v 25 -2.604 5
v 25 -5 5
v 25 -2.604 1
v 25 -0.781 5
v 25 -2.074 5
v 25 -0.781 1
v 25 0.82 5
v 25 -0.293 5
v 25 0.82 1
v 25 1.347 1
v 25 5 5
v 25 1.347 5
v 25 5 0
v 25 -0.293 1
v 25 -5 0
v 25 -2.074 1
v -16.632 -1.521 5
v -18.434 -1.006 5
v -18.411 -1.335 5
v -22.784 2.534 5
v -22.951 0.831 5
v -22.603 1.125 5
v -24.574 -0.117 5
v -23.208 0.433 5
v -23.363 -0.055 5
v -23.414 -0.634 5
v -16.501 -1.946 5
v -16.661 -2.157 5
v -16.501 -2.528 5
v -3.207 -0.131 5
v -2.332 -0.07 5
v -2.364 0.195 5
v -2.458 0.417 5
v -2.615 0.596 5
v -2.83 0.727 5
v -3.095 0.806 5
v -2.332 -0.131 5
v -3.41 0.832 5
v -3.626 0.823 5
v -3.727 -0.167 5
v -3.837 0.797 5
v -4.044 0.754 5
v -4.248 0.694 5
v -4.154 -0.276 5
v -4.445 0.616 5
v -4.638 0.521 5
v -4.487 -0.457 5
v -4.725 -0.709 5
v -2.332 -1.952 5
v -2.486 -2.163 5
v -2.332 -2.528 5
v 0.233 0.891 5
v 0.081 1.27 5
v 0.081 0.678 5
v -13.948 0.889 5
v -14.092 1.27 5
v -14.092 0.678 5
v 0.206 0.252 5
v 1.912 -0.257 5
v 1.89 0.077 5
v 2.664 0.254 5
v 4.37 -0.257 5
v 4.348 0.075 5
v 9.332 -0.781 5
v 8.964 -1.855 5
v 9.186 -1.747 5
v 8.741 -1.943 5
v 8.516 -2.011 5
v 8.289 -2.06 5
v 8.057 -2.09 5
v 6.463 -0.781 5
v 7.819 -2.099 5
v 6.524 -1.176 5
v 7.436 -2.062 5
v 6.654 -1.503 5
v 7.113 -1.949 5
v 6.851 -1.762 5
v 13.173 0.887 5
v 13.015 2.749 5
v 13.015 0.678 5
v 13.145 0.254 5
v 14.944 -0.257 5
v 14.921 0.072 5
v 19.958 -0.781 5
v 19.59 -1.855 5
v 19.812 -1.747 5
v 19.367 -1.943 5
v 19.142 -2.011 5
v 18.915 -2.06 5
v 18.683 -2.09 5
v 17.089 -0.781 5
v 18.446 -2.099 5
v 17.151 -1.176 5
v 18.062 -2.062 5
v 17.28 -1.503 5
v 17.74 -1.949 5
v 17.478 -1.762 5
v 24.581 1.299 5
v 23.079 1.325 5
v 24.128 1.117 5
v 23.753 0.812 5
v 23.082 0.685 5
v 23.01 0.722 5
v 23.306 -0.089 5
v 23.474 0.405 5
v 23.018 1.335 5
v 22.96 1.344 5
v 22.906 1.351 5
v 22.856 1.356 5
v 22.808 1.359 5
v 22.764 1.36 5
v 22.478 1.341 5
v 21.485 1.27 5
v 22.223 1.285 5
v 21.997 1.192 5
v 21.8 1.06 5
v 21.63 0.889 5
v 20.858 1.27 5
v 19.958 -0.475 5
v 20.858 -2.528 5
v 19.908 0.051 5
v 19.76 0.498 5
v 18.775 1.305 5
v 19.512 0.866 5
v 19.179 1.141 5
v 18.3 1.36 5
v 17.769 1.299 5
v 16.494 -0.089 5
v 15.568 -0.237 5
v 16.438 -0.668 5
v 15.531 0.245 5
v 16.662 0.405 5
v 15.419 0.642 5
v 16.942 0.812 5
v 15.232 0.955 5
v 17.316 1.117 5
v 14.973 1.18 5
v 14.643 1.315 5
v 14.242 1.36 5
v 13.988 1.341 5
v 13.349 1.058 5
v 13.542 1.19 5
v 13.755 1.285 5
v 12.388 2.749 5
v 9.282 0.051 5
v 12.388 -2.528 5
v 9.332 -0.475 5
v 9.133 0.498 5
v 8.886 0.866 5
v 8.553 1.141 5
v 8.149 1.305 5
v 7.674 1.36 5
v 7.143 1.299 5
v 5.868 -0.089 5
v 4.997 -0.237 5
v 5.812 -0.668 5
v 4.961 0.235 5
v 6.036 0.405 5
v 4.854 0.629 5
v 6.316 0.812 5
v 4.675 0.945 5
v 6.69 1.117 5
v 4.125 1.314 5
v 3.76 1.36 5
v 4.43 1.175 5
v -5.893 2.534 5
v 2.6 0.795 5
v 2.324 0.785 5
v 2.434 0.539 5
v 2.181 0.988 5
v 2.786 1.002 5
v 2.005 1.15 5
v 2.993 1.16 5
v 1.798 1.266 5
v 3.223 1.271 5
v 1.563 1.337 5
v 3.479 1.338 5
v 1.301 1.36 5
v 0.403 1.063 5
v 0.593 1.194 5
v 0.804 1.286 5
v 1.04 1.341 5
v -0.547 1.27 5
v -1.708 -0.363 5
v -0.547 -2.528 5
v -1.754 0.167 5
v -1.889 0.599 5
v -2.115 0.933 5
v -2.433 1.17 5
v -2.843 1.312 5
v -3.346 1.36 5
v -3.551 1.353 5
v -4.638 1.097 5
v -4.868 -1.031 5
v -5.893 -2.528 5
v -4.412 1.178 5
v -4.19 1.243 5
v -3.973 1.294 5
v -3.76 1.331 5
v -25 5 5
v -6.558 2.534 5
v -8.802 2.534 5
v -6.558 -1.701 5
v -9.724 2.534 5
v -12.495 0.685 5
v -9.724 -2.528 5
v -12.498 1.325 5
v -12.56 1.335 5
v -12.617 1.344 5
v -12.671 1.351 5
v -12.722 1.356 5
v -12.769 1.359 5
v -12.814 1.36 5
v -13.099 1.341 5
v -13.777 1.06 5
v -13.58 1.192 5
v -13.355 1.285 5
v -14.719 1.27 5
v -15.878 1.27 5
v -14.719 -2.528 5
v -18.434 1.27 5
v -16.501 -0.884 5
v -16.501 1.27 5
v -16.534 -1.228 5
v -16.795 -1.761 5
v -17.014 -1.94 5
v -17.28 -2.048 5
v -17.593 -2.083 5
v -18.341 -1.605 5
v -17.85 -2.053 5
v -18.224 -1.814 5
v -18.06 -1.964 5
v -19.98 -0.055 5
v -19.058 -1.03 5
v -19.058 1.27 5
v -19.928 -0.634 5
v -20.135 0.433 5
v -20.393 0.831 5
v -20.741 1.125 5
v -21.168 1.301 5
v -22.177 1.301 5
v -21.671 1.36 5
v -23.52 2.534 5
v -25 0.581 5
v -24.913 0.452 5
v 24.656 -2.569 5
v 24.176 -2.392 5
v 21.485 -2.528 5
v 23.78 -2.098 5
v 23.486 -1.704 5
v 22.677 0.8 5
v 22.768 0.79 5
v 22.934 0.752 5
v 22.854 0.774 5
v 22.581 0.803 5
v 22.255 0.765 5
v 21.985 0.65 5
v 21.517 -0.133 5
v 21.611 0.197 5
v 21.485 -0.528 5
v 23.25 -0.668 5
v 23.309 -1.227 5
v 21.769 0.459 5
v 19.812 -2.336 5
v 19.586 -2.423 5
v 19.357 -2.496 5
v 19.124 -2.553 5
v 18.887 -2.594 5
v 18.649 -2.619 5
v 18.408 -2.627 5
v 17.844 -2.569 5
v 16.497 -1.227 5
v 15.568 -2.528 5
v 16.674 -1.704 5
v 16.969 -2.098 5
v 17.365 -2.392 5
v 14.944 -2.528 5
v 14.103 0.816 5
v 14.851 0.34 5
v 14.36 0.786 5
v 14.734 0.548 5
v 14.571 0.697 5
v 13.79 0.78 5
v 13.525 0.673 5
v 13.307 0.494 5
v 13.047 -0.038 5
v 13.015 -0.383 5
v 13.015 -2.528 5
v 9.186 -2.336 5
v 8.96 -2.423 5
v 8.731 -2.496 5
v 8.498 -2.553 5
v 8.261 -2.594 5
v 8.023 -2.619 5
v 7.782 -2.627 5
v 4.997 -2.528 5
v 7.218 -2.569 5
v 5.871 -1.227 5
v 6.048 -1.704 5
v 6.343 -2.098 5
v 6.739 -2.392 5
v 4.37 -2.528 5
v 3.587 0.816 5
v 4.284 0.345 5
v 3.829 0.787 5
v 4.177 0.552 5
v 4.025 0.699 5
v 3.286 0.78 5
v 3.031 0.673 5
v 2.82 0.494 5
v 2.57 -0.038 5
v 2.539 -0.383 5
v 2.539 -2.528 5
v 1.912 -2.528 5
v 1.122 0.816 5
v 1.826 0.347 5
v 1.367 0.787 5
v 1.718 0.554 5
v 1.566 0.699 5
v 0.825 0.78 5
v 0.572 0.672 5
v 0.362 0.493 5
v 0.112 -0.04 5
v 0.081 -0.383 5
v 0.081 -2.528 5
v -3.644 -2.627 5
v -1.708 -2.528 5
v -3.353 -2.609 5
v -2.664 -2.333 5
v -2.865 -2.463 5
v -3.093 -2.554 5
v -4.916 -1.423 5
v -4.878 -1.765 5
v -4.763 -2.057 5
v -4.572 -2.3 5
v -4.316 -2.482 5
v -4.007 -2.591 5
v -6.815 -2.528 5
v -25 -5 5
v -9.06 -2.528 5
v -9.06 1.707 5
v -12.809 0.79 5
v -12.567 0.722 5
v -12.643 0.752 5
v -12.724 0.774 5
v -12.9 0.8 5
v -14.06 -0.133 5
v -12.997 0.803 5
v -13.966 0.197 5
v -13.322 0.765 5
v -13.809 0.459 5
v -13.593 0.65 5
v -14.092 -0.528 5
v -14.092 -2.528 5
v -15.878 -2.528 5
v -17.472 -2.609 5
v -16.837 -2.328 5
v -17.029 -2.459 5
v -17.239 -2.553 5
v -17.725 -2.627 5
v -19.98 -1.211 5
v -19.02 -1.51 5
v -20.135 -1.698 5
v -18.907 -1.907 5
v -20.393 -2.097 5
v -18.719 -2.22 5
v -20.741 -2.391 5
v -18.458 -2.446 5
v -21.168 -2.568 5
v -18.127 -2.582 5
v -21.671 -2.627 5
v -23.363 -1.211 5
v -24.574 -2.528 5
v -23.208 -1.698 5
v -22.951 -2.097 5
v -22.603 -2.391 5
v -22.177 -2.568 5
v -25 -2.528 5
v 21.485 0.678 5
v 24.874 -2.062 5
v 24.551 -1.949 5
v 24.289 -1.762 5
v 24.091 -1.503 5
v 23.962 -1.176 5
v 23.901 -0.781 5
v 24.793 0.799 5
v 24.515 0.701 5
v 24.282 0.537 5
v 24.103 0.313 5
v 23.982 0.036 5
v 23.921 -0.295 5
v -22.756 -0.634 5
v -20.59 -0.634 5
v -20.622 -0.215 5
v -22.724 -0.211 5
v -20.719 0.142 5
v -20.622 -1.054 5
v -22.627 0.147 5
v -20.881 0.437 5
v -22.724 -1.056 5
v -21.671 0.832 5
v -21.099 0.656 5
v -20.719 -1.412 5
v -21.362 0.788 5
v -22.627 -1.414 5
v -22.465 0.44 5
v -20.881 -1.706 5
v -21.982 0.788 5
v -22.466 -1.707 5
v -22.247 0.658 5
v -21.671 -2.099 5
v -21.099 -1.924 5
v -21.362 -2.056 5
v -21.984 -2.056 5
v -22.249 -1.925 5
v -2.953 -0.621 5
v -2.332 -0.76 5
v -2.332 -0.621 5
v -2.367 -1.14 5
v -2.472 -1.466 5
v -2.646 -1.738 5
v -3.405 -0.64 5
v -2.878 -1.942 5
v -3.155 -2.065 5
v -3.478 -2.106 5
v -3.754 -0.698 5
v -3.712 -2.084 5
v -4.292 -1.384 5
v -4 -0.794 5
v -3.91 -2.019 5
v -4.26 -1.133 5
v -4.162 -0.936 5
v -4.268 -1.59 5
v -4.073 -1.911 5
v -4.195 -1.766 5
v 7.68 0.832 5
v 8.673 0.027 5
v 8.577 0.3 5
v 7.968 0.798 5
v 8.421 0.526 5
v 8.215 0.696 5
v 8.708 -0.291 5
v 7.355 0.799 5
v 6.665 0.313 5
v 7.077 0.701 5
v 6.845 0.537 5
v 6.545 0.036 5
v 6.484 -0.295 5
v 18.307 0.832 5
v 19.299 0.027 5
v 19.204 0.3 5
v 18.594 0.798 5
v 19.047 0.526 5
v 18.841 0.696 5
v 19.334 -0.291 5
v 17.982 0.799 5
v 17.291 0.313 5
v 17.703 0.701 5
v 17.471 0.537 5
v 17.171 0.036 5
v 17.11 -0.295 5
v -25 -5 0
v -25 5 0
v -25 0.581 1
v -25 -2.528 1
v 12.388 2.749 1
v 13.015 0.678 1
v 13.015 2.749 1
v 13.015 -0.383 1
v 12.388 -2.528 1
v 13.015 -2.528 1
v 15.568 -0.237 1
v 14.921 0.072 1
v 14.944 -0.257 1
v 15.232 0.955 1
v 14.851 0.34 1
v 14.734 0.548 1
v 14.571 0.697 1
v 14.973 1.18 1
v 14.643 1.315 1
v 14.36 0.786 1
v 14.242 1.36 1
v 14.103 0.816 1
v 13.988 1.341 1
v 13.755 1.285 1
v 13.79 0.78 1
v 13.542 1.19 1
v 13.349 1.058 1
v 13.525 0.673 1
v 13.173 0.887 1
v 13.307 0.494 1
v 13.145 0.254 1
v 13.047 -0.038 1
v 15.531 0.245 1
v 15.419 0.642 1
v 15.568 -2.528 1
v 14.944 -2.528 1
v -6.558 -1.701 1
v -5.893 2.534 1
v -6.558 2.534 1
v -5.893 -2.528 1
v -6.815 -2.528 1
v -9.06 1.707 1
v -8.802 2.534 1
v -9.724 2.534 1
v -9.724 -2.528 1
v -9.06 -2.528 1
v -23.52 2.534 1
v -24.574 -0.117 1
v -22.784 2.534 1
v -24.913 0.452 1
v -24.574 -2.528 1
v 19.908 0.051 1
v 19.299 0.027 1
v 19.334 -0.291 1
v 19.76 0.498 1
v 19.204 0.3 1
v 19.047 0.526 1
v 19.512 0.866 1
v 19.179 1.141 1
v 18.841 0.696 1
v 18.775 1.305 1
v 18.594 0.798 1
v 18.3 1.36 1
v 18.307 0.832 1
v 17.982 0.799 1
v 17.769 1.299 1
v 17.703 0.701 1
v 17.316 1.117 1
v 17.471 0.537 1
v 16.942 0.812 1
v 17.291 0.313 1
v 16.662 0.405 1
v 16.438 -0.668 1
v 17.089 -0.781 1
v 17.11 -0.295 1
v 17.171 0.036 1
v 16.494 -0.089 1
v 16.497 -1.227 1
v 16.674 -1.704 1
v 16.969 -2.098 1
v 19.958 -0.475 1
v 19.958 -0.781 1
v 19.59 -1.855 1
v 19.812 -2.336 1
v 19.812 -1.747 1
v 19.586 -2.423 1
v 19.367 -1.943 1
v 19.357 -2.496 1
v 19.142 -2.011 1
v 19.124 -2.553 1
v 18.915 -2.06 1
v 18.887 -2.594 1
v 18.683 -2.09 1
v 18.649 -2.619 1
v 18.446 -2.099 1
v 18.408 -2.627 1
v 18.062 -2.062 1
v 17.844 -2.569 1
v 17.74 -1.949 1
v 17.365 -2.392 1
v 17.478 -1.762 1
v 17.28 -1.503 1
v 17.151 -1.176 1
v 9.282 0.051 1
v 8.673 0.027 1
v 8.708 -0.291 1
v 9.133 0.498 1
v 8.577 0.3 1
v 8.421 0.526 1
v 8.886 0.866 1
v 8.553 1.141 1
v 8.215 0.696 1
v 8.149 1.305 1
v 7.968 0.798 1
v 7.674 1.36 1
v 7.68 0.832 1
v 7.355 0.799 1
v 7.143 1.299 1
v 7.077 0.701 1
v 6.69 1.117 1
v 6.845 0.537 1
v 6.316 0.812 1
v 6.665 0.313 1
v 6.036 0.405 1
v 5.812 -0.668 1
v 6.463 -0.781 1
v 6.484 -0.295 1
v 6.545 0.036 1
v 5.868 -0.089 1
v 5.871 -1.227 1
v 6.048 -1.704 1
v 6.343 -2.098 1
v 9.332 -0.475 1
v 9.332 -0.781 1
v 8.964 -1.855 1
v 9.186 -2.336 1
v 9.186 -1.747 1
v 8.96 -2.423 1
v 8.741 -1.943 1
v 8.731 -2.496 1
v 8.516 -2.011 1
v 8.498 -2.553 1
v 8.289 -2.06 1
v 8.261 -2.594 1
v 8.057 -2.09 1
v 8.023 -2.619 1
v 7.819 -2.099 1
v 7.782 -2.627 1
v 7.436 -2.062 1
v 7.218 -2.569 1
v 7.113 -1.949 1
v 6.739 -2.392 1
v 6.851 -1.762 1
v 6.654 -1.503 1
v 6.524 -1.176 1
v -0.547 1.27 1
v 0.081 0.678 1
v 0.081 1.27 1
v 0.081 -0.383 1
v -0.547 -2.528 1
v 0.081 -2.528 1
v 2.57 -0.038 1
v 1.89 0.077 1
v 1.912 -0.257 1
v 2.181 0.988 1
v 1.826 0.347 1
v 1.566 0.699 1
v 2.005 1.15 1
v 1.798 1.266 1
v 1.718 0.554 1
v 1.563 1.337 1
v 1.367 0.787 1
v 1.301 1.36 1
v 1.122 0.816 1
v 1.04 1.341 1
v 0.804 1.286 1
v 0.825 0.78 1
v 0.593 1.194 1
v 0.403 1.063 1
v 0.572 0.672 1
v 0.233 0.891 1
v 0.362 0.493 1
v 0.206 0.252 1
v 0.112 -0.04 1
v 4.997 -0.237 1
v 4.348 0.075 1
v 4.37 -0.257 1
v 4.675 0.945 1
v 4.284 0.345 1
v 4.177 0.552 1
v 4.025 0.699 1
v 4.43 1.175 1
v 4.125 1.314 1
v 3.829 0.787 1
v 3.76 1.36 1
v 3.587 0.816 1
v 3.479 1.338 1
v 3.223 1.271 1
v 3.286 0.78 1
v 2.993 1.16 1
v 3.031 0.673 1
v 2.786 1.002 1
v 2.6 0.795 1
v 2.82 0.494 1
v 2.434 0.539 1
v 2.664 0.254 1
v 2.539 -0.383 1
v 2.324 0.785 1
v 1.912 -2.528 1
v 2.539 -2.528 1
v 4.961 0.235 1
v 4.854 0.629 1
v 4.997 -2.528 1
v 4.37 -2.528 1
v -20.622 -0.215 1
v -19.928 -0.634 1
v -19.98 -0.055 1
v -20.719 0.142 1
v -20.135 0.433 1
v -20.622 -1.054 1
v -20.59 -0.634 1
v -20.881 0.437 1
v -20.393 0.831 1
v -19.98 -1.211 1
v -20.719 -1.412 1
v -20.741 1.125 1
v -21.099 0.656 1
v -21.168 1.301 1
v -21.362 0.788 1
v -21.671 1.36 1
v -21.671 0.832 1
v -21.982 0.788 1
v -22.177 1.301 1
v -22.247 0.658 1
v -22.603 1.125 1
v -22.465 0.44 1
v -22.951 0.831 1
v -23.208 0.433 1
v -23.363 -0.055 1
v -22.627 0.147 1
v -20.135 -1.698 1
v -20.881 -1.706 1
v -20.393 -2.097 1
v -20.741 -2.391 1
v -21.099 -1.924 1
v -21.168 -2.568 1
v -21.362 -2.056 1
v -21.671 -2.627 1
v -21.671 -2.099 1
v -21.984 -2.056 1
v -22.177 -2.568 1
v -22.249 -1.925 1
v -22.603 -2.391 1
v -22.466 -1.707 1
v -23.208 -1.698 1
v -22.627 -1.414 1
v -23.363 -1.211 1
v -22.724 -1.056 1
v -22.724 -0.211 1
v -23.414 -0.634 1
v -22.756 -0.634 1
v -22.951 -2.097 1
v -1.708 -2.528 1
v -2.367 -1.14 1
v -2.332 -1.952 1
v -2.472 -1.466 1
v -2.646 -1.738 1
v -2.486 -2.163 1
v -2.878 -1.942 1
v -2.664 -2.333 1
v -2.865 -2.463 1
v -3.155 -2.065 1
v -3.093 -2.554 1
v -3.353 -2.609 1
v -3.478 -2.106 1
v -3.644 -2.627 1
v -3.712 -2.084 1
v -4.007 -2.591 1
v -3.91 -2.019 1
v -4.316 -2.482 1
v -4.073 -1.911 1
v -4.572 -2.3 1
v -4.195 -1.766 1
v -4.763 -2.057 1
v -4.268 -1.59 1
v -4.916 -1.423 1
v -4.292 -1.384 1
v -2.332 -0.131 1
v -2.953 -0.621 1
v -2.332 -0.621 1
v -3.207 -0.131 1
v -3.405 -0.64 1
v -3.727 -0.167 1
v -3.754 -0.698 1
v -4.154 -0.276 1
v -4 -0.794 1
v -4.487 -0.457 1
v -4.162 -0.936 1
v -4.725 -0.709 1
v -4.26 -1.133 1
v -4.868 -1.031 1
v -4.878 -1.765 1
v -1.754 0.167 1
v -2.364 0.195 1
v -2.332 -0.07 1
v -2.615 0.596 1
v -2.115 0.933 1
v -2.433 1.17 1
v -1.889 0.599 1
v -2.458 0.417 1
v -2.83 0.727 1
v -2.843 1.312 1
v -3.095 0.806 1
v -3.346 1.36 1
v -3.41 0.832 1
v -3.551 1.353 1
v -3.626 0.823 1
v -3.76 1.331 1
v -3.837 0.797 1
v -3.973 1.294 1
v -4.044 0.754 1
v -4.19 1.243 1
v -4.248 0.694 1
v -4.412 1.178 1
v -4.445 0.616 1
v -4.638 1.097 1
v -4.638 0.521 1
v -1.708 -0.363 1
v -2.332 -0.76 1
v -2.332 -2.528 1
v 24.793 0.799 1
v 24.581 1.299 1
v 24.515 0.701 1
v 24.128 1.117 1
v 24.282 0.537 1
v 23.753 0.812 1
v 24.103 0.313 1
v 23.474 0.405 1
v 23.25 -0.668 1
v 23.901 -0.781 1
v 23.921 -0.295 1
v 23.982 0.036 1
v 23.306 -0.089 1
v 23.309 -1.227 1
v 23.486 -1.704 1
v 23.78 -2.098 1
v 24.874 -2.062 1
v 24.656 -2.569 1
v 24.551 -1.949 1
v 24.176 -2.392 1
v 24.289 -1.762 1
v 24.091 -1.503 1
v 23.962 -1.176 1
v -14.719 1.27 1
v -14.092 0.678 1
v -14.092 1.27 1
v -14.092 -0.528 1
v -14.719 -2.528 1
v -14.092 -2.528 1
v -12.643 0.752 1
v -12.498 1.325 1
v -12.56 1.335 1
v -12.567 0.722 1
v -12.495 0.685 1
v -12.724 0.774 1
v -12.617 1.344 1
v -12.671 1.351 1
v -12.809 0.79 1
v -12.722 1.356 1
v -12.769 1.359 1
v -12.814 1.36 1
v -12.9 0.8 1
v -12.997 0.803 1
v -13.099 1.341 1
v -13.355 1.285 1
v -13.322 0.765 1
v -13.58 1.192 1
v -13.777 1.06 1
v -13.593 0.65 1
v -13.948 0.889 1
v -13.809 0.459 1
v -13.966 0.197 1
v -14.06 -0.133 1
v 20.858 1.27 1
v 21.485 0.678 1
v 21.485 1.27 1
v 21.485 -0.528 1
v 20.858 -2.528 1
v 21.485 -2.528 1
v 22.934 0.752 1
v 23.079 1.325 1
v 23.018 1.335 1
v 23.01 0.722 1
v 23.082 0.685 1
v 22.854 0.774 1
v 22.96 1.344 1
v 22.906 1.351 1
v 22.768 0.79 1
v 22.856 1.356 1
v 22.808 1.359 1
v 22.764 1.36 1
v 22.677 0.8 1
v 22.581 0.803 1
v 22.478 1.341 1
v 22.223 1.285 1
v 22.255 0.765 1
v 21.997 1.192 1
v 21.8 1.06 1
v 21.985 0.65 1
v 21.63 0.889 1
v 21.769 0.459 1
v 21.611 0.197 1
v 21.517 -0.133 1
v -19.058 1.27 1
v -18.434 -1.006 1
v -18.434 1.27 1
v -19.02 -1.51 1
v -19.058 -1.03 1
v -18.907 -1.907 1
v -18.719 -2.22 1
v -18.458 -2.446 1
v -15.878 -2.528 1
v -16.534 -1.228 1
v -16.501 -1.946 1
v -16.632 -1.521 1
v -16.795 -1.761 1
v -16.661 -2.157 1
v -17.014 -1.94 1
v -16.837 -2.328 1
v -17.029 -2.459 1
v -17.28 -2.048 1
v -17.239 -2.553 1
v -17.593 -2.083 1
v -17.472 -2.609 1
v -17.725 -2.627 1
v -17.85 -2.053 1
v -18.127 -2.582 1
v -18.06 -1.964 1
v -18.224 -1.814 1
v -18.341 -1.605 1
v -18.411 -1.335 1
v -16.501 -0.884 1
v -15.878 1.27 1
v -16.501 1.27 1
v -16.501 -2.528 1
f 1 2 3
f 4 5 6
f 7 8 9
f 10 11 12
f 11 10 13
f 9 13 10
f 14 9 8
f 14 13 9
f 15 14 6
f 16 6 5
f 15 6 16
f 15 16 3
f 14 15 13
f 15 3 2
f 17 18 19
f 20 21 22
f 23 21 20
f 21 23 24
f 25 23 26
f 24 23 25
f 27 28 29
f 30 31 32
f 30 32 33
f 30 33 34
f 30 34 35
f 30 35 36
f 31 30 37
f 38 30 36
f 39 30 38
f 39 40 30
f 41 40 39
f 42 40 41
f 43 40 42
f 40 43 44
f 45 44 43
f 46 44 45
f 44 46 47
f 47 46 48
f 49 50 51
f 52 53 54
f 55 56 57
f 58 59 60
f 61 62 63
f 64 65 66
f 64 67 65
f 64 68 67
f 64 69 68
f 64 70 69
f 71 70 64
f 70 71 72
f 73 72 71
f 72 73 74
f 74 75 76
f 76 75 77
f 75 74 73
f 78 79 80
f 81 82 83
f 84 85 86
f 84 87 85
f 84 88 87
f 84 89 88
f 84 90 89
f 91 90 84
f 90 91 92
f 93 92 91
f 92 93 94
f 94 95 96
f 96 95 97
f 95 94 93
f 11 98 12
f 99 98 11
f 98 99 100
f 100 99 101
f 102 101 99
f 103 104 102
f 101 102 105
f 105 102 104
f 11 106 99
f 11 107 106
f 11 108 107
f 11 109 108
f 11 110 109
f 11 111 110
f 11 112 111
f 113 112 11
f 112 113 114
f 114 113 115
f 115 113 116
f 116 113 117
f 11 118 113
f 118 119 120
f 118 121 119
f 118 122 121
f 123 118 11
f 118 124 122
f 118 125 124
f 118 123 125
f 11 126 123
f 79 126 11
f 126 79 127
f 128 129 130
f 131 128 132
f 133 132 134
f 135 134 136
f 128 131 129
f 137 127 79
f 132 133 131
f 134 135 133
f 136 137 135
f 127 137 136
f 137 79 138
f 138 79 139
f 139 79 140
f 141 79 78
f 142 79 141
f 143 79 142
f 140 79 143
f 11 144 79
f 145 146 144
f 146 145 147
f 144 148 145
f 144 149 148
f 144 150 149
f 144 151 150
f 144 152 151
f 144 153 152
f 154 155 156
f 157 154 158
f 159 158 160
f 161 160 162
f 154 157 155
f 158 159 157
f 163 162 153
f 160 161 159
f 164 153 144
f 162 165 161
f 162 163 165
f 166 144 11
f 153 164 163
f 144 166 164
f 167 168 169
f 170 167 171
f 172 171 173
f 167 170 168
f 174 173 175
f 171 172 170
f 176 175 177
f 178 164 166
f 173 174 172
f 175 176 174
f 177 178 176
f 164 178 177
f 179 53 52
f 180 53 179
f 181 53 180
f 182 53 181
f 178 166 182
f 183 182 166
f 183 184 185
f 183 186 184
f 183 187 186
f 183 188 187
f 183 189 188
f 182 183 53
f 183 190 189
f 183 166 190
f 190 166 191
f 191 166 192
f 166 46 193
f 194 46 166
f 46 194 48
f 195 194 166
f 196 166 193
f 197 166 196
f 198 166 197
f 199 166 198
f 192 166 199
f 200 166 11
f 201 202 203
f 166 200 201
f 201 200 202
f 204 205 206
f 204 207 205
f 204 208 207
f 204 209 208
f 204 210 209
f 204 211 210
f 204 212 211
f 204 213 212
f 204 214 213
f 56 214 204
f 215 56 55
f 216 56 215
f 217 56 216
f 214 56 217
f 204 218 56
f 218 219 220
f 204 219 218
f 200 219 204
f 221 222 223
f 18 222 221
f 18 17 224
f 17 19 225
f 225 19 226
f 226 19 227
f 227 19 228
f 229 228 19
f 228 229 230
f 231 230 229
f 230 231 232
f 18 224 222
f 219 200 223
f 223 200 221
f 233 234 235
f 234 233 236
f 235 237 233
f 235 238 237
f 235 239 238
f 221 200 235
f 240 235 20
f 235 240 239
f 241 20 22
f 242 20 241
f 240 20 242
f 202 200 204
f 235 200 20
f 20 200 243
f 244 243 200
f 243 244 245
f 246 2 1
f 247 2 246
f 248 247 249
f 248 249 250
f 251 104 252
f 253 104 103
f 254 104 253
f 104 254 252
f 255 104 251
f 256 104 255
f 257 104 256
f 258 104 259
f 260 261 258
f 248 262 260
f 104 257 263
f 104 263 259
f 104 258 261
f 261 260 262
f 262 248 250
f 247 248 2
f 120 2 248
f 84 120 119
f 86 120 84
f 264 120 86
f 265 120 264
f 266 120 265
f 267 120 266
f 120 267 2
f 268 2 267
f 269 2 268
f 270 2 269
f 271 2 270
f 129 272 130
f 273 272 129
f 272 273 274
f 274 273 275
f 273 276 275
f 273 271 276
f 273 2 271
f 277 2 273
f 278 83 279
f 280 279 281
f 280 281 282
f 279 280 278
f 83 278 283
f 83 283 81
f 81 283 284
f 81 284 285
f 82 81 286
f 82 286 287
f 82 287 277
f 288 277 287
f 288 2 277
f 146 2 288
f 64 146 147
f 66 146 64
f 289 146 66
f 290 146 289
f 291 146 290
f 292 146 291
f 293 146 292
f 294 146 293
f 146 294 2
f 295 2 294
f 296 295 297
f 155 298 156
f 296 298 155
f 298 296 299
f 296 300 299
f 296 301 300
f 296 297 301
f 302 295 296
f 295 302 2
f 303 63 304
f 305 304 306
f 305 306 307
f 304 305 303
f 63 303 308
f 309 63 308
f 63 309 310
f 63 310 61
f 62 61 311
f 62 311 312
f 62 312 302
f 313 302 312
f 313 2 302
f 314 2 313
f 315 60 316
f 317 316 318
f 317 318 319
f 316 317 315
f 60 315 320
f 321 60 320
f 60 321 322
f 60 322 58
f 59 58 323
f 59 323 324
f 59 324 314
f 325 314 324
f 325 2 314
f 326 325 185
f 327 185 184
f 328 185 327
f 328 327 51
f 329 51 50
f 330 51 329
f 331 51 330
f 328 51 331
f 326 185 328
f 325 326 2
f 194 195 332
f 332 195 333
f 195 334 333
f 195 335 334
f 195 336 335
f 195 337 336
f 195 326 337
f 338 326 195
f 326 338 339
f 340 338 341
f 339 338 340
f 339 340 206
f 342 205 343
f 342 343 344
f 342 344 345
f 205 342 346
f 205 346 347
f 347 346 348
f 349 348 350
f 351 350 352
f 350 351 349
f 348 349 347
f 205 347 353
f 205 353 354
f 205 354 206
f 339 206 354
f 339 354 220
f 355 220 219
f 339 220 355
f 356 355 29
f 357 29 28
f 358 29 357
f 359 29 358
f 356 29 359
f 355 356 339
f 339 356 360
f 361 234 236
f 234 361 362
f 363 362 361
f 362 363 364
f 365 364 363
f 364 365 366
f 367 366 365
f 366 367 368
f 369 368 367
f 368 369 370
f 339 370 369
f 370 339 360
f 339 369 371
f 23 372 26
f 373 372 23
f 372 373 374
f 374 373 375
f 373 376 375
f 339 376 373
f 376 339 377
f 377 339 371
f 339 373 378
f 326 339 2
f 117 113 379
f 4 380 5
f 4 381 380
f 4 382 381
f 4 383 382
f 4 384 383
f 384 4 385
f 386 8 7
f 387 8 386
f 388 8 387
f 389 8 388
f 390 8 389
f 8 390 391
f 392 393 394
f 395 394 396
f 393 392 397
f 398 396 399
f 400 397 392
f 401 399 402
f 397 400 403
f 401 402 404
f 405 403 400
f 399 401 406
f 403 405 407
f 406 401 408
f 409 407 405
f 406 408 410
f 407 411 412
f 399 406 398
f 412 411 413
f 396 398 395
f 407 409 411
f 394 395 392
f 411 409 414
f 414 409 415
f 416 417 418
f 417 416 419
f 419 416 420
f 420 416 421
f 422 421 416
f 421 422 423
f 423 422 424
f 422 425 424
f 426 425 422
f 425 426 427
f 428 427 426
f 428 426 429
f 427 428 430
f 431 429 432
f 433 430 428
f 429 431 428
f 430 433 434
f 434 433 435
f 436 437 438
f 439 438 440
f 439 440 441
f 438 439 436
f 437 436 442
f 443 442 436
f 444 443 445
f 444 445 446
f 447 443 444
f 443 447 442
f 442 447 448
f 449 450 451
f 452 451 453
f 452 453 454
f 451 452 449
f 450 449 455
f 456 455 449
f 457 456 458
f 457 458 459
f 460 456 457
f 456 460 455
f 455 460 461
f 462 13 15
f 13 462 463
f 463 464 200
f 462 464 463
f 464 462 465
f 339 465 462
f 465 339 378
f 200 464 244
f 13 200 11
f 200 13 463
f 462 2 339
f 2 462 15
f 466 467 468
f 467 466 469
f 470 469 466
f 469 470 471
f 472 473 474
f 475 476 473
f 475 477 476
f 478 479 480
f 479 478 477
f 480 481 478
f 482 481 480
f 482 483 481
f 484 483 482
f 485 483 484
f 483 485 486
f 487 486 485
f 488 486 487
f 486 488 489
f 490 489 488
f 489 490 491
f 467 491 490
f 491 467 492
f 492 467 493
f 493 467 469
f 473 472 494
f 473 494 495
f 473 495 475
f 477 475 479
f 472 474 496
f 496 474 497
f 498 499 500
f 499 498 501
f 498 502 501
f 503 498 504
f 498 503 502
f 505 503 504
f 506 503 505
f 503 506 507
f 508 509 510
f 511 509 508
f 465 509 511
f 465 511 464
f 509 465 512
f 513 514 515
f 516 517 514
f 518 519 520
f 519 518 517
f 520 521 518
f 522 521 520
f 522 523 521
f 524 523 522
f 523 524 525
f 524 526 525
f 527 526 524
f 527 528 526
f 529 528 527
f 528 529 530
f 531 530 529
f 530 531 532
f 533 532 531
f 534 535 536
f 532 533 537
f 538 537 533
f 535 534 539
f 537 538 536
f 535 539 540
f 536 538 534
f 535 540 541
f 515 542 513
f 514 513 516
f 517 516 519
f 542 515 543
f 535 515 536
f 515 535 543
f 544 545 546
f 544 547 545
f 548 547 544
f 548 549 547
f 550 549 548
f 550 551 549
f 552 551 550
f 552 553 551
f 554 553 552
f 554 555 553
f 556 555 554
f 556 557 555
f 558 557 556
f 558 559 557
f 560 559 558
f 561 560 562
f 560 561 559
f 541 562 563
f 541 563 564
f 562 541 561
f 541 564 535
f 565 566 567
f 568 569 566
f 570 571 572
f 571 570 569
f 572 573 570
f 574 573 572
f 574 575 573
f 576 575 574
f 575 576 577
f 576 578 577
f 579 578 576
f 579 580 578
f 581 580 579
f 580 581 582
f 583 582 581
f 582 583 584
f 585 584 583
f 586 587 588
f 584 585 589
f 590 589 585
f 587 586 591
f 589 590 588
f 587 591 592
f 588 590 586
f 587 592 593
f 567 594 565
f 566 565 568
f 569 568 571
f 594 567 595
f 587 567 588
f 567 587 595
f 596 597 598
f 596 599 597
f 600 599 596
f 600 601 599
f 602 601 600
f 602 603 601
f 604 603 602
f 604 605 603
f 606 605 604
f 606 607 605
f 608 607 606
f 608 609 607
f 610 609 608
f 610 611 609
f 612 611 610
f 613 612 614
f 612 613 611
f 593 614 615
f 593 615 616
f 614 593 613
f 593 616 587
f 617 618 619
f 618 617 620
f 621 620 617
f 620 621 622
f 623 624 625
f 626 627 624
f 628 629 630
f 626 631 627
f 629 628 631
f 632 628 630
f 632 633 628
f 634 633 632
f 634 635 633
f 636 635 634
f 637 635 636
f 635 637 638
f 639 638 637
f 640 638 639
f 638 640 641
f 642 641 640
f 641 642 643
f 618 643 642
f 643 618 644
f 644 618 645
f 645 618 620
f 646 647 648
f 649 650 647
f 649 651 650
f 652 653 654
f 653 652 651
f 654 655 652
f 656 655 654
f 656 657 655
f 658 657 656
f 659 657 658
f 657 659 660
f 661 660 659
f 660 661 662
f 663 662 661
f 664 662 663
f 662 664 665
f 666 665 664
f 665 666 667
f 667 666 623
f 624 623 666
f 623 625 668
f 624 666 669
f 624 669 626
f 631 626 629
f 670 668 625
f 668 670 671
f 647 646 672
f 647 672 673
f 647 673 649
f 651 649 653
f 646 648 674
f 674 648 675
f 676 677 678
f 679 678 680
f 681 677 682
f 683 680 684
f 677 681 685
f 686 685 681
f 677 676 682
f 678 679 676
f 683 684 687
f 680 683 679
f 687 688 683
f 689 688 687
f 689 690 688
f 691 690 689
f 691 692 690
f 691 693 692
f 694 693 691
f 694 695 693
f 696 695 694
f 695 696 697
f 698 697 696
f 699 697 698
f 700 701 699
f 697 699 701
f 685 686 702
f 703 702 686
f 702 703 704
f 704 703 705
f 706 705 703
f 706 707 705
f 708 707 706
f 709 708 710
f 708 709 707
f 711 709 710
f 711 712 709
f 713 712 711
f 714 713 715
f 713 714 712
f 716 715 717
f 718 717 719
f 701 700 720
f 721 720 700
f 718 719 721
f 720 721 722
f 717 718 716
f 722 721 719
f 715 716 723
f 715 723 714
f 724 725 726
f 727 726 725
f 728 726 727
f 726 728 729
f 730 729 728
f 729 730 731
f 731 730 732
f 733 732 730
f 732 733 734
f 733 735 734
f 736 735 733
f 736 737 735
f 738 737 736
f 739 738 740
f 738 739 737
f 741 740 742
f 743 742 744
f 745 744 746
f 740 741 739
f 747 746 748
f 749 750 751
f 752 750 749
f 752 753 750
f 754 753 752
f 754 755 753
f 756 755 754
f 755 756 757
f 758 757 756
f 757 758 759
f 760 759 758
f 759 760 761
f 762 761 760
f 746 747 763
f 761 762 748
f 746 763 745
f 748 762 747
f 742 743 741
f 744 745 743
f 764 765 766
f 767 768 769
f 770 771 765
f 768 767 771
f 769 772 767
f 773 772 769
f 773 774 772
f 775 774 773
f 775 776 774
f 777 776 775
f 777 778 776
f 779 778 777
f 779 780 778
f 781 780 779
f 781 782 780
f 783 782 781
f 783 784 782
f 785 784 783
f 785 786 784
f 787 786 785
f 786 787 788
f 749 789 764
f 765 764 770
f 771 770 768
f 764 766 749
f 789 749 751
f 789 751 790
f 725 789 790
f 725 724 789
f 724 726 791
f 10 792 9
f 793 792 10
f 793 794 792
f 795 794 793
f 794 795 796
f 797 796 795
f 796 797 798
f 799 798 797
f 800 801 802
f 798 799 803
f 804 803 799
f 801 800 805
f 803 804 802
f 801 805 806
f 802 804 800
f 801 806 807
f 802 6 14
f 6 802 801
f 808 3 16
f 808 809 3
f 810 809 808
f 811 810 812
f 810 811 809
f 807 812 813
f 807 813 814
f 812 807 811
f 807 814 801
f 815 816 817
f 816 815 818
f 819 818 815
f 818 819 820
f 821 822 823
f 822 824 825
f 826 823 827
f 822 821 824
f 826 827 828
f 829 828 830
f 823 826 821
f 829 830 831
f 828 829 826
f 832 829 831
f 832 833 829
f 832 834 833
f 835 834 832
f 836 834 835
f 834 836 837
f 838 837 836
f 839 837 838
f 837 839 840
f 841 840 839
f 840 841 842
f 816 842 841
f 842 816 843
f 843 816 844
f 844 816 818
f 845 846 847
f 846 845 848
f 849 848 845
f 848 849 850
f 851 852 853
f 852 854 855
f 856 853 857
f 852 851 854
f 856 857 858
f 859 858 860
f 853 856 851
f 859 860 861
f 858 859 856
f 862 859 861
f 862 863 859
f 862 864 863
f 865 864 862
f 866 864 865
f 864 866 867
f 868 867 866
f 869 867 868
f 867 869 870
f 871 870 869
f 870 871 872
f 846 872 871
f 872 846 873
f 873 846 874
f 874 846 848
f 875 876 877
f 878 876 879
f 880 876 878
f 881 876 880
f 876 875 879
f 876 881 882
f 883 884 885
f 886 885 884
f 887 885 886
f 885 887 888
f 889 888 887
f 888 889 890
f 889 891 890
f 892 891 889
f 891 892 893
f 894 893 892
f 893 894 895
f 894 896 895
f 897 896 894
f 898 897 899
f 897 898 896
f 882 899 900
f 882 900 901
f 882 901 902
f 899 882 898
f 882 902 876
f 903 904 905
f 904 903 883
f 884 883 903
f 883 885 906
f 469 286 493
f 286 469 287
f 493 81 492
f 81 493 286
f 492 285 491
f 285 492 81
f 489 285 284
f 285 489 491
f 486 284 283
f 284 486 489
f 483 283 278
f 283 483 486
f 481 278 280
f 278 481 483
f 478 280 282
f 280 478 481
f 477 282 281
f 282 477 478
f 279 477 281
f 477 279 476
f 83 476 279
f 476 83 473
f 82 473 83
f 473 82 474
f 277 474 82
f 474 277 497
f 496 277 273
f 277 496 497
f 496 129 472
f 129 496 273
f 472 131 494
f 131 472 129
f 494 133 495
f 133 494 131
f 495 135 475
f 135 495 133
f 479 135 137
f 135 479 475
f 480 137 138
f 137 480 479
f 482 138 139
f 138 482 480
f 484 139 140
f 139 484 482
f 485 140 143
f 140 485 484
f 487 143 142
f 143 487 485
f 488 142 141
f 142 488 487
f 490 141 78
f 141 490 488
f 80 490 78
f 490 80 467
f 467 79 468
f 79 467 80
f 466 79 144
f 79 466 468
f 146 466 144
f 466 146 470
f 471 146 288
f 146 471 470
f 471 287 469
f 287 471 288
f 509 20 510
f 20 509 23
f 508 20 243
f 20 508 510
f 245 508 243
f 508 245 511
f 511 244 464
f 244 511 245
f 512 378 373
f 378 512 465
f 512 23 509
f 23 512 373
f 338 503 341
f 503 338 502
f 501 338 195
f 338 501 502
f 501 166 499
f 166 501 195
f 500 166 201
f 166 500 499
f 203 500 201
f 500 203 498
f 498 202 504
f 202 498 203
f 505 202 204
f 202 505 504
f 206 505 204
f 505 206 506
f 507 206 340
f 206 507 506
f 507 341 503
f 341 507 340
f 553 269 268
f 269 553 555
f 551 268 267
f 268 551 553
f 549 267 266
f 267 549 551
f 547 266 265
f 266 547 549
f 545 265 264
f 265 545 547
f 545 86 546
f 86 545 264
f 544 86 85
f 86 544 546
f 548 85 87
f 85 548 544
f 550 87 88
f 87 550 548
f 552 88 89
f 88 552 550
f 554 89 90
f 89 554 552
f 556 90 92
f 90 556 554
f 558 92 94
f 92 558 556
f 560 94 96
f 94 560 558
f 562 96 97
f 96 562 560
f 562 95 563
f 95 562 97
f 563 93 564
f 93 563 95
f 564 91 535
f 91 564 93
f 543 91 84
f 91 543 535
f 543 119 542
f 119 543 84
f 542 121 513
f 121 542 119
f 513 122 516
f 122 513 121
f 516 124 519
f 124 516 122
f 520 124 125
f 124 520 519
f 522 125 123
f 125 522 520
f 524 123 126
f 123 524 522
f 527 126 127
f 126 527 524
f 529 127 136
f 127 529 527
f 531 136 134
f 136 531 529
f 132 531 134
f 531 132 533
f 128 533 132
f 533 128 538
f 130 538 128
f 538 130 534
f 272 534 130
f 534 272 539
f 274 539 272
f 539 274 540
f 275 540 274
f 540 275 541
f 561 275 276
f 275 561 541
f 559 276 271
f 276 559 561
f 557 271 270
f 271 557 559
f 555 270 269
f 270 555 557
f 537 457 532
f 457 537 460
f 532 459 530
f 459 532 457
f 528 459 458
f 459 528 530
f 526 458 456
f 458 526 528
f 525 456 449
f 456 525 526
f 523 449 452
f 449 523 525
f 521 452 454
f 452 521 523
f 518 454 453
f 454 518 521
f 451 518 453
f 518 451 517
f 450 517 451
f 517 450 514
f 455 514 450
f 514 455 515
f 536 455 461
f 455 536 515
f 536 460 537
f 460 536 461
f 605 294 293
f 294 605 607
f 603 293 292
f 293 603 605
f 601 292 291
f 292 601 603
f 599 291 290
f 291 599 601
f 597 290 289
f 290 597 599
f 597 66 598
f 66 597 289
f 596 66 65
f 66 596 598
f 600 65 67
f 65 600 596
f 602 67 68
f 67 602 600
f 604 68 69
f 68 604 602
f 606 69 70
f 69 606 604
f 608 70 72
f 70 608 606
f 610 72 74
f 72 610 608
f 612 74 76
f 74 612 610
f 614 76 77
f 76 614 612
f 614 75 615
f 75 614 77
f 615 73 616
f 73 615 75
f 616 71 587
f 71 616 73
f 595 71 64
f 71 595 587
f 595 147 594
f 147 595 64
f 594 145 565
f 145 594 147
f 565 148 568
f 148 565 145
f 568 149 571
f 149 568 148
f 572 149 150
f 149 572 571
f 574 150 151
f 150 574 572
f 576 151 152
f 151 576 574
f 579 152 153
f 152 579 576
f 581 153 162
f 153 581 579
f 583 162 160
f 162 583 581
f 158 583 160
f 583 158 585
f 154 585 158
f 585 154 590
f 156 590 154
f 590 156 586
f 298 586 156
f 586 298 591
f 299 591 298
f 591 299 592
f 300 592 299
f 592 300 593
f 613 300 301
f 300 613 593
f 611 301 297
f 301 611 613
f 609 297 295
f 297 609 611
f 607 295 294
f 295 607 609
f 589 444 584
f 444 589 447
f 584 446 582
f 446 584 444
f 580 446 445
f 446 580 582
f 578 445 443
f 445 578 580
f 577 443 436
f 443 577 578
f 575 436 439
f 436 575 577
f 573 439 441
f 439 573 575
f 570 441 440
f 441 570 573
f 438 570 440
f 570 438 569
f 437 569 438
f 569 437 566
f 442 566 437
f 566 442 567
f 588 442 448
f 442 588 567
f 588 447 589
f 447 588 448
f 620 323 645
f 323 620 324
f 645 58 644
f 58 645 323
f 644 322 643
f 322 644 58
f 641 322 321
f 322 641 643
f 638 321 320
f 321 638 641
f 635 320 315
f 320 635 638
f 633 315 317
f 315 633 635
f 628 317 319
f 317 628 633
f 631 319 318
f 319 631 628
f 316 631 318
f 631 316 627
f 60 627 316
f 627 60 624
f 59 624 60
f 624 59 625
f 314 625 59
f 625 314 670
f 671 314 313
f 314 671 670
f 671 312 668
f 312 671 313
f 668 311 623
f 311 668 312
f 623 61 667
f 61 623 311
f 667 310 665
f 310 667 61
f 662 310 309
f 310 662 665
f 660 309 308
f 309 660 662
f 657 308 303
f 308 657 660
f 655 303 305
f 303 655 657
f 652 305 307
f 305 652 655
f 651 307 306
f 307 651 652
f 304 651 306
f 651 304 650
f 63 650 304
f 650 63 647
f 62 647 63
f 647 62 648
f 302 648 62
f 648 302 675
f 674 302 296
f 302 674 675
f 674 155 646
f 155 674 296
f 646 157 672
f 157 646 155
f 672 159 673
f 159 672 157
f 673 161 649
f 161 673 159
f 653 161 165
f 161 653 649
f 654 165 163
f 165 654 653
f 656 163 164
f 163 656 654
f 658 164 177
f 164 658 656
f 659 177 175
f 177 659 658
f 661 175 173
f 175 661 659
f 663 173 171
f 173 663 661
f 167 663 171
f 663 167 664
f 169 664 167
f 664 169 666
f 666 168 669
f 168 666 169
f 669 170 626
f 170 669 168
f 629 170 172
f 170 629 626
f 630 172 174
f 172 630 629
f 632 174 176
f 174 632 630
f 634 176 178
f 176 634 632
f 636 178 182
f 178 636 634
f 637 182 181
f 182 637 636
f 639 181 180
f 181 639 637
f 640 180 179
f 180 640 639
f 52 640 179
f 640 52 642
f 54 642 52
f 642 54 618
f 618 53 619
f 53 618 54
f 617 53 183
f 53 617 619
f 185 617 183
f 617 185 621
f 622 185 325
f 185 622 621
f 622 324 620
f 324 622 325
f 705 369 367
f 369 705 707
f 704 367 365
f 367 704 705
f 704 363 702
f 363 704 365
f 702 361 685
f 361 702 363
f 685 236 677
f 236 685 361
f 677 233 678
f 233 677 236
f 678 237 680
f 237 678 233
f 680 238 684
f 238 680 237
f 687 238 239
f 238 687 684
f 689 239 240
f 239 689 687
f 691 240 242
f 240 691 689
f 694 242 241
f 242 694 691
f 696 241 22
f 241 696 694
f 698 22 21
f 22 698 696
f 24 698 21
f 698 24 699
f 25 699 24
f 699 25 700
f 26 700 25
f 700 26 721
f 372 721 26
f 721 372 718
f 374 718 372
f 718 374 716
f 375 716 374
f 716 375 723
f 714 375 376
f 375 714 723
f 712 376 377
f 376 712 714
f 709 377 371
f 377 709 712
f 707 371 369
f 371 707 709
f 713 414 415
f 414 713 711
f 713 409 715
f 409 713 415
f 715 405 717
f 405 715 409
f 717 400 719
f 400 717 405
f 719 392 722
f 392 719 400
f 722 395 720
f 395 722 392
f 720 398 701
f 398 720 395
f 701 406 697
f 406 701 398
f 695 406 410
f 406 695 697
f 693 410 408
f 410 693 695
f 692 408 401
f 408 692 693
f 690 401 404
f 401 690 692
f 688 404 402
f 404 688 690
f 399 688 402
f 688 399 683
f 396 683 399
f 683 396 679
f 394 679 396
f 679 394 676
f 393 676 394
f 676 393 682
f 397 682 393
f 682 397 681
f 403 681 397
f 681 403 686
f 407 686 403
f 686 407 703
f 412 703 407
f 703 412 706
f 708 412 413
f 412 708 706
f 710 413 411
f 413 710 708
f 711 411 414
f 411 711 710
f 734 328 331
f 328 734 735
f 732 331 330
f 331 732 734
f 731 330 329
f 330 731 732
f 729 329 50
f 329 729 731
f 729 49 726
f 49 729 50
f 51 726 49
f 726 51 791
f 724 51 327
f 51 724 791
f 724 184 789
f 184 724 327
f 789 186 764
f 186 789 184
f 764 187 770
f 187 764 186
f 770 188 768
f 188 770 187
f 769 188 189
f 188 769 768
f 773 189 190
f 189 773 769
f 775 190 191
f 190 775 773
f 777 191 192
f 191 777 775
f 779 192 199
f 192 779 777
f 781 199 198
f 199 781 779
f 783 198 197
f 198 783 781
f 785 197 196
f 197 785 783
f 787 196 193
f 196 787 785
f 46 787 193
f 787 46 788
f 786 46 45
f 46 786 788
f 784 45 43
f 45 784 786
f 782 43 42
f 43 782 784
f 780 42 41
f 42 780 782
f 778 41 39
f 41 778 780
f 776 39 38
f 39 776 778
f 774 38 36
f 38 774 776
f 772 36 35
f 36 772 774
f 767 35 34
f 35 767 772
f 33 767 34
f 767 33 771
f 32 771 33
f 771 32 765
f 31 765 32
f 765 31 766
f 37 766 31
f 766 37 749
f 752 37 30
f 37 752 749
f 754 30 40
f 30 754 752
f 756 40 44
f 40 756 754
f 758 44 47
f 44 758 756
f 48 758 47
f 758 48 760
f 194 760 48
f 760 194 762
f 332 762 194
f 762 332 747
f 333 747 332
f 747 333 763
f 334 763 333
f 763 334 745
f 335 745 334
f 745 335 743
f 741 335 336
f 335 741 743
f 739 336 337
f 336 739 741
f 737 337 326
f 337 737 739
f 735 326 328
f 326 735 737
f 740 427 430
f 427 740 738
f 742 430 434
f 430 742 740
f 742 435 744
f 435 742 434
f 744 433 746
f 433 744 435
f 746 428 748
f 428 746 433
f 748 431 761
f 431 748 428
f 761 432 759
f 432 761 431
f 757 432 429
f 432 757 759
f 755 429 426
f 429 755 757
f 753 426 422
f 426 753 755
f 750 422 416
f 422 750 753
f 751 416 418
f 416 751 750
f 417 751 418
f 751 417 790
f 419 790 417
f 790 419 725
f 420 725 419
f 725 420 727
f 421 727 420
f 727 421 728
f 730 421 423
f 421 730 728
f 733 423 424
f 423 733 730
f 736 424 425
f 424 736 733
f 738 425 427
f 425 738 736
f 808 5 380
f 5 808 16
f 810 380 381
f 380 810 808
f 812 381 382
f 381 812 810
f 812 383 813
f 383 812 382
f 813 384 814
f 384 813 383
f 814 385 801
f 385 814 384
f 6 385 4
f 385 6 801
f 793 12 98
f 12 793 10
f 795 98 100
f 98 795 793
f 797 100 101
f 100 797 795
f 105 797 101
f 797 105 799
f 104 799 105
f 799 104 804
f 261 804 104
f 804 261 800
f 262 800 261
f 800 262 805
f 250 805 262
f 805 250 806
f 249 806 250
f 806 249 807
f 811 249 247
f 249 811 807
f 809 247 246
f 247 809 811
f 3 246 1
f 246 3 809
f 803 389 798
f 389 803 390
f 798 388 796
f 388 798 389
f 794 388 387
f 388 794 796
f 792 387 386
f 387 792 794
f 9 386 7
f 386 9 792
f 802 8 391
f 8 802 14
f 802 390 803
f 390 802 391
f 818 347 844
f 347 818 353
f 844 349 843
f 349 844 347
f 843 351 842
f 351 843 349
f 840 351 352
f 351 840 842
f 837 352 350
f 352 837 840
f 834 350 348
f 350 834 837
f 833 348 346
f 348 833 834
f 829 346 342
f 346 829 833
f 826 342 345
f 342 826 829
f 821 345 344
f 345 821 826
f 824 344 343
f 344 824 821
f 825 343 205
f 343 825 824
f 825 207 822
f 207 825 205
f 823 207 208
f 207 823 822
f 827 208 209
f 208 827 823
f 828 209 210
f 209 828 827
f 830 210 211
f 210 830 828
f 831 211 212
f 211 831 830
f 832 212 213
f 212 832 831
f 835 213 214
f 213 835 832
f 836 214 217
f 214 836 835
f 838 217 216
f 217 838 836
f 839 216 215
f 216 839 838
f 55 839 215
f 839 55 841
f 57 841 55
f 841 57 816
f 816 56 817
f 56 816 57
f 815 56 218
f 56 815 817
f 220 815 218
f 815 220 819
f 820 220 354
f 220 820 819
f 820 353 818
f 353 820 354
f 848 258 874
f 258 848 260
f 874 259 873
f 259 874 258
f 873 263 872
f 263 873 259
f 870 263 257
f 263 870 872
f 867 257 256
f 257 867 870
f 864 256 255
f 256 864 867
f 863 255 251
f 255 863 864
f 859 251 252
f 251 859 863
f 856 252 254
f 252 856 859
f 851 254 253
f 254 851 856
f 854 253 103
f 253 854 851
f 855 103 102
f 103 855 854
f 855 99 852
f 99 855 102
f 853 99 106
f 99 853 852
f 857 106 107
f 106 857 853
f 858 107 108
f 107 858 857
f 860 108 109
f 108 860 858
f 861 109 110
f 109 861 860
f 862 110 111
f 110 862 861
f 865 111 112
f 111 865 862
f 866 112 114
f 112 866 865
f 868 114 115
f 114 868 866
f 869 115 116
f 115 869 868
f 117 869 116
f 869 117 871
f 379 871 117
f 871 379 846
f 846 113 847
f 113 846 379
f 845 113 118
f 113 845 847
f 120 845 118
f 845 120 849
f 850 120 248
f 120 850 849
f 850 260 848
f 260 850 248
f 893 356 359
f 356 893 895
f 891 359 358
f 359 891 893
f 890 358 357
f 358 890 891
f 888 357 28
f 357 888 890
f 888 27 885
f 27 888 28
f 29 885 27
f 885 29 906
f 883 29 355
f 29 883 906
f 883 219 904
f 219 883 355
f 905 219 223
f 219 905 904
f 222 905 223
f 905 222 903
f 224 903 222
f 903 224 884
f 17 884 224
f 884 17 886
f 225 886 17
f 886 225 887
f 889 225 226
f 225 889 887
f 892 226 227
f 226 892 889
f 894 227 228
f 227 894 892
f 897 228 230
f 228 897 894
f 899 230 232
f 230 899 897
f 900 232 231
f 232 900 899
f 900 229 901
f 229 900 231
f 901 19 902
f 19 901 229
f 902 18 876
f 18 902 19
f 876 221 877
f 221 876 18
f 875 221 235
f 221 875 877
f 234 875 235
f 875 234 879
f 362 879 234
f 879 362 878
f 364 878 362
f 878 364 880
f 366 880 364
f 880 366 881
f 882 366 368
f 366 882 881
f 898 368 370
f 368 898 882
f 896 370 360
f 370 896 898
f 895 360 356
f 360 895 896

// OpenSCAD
/*[User Defined Variables]*/

//String to be printed
name = "Your Name here";

//Size of the letters (in mm)
letterSize = 5;

//X Tolerance (in mm)
widthTolerance = -20;

//Y Tolerance (in mm)
lengthTolerance = 5;

//Height (in mm)
height = 5;

//How far the letter extrude goes for the string(MAX SIZE IS THE HEIGHT)
letterExtrude = 4; 

// Computation
stringLength = len(name);
width = (stringLength * (letterSize)) + widthTolerance;
length = letterSize + lengthTolerance;
difference() {
    translate([0,0,height/2]) cube([width,length,height], center=true);
    translate([0,0,height - letterExtrude]) {
        // convexity is needed for correct preview
        // since characters can be highly concave
        linear_extrude(height, convexity=4)
            text(name, 
                 letterSize,
                 font="Bitstream Vera Sans",
                 halign="center",
                 valign="center");
    }
}
